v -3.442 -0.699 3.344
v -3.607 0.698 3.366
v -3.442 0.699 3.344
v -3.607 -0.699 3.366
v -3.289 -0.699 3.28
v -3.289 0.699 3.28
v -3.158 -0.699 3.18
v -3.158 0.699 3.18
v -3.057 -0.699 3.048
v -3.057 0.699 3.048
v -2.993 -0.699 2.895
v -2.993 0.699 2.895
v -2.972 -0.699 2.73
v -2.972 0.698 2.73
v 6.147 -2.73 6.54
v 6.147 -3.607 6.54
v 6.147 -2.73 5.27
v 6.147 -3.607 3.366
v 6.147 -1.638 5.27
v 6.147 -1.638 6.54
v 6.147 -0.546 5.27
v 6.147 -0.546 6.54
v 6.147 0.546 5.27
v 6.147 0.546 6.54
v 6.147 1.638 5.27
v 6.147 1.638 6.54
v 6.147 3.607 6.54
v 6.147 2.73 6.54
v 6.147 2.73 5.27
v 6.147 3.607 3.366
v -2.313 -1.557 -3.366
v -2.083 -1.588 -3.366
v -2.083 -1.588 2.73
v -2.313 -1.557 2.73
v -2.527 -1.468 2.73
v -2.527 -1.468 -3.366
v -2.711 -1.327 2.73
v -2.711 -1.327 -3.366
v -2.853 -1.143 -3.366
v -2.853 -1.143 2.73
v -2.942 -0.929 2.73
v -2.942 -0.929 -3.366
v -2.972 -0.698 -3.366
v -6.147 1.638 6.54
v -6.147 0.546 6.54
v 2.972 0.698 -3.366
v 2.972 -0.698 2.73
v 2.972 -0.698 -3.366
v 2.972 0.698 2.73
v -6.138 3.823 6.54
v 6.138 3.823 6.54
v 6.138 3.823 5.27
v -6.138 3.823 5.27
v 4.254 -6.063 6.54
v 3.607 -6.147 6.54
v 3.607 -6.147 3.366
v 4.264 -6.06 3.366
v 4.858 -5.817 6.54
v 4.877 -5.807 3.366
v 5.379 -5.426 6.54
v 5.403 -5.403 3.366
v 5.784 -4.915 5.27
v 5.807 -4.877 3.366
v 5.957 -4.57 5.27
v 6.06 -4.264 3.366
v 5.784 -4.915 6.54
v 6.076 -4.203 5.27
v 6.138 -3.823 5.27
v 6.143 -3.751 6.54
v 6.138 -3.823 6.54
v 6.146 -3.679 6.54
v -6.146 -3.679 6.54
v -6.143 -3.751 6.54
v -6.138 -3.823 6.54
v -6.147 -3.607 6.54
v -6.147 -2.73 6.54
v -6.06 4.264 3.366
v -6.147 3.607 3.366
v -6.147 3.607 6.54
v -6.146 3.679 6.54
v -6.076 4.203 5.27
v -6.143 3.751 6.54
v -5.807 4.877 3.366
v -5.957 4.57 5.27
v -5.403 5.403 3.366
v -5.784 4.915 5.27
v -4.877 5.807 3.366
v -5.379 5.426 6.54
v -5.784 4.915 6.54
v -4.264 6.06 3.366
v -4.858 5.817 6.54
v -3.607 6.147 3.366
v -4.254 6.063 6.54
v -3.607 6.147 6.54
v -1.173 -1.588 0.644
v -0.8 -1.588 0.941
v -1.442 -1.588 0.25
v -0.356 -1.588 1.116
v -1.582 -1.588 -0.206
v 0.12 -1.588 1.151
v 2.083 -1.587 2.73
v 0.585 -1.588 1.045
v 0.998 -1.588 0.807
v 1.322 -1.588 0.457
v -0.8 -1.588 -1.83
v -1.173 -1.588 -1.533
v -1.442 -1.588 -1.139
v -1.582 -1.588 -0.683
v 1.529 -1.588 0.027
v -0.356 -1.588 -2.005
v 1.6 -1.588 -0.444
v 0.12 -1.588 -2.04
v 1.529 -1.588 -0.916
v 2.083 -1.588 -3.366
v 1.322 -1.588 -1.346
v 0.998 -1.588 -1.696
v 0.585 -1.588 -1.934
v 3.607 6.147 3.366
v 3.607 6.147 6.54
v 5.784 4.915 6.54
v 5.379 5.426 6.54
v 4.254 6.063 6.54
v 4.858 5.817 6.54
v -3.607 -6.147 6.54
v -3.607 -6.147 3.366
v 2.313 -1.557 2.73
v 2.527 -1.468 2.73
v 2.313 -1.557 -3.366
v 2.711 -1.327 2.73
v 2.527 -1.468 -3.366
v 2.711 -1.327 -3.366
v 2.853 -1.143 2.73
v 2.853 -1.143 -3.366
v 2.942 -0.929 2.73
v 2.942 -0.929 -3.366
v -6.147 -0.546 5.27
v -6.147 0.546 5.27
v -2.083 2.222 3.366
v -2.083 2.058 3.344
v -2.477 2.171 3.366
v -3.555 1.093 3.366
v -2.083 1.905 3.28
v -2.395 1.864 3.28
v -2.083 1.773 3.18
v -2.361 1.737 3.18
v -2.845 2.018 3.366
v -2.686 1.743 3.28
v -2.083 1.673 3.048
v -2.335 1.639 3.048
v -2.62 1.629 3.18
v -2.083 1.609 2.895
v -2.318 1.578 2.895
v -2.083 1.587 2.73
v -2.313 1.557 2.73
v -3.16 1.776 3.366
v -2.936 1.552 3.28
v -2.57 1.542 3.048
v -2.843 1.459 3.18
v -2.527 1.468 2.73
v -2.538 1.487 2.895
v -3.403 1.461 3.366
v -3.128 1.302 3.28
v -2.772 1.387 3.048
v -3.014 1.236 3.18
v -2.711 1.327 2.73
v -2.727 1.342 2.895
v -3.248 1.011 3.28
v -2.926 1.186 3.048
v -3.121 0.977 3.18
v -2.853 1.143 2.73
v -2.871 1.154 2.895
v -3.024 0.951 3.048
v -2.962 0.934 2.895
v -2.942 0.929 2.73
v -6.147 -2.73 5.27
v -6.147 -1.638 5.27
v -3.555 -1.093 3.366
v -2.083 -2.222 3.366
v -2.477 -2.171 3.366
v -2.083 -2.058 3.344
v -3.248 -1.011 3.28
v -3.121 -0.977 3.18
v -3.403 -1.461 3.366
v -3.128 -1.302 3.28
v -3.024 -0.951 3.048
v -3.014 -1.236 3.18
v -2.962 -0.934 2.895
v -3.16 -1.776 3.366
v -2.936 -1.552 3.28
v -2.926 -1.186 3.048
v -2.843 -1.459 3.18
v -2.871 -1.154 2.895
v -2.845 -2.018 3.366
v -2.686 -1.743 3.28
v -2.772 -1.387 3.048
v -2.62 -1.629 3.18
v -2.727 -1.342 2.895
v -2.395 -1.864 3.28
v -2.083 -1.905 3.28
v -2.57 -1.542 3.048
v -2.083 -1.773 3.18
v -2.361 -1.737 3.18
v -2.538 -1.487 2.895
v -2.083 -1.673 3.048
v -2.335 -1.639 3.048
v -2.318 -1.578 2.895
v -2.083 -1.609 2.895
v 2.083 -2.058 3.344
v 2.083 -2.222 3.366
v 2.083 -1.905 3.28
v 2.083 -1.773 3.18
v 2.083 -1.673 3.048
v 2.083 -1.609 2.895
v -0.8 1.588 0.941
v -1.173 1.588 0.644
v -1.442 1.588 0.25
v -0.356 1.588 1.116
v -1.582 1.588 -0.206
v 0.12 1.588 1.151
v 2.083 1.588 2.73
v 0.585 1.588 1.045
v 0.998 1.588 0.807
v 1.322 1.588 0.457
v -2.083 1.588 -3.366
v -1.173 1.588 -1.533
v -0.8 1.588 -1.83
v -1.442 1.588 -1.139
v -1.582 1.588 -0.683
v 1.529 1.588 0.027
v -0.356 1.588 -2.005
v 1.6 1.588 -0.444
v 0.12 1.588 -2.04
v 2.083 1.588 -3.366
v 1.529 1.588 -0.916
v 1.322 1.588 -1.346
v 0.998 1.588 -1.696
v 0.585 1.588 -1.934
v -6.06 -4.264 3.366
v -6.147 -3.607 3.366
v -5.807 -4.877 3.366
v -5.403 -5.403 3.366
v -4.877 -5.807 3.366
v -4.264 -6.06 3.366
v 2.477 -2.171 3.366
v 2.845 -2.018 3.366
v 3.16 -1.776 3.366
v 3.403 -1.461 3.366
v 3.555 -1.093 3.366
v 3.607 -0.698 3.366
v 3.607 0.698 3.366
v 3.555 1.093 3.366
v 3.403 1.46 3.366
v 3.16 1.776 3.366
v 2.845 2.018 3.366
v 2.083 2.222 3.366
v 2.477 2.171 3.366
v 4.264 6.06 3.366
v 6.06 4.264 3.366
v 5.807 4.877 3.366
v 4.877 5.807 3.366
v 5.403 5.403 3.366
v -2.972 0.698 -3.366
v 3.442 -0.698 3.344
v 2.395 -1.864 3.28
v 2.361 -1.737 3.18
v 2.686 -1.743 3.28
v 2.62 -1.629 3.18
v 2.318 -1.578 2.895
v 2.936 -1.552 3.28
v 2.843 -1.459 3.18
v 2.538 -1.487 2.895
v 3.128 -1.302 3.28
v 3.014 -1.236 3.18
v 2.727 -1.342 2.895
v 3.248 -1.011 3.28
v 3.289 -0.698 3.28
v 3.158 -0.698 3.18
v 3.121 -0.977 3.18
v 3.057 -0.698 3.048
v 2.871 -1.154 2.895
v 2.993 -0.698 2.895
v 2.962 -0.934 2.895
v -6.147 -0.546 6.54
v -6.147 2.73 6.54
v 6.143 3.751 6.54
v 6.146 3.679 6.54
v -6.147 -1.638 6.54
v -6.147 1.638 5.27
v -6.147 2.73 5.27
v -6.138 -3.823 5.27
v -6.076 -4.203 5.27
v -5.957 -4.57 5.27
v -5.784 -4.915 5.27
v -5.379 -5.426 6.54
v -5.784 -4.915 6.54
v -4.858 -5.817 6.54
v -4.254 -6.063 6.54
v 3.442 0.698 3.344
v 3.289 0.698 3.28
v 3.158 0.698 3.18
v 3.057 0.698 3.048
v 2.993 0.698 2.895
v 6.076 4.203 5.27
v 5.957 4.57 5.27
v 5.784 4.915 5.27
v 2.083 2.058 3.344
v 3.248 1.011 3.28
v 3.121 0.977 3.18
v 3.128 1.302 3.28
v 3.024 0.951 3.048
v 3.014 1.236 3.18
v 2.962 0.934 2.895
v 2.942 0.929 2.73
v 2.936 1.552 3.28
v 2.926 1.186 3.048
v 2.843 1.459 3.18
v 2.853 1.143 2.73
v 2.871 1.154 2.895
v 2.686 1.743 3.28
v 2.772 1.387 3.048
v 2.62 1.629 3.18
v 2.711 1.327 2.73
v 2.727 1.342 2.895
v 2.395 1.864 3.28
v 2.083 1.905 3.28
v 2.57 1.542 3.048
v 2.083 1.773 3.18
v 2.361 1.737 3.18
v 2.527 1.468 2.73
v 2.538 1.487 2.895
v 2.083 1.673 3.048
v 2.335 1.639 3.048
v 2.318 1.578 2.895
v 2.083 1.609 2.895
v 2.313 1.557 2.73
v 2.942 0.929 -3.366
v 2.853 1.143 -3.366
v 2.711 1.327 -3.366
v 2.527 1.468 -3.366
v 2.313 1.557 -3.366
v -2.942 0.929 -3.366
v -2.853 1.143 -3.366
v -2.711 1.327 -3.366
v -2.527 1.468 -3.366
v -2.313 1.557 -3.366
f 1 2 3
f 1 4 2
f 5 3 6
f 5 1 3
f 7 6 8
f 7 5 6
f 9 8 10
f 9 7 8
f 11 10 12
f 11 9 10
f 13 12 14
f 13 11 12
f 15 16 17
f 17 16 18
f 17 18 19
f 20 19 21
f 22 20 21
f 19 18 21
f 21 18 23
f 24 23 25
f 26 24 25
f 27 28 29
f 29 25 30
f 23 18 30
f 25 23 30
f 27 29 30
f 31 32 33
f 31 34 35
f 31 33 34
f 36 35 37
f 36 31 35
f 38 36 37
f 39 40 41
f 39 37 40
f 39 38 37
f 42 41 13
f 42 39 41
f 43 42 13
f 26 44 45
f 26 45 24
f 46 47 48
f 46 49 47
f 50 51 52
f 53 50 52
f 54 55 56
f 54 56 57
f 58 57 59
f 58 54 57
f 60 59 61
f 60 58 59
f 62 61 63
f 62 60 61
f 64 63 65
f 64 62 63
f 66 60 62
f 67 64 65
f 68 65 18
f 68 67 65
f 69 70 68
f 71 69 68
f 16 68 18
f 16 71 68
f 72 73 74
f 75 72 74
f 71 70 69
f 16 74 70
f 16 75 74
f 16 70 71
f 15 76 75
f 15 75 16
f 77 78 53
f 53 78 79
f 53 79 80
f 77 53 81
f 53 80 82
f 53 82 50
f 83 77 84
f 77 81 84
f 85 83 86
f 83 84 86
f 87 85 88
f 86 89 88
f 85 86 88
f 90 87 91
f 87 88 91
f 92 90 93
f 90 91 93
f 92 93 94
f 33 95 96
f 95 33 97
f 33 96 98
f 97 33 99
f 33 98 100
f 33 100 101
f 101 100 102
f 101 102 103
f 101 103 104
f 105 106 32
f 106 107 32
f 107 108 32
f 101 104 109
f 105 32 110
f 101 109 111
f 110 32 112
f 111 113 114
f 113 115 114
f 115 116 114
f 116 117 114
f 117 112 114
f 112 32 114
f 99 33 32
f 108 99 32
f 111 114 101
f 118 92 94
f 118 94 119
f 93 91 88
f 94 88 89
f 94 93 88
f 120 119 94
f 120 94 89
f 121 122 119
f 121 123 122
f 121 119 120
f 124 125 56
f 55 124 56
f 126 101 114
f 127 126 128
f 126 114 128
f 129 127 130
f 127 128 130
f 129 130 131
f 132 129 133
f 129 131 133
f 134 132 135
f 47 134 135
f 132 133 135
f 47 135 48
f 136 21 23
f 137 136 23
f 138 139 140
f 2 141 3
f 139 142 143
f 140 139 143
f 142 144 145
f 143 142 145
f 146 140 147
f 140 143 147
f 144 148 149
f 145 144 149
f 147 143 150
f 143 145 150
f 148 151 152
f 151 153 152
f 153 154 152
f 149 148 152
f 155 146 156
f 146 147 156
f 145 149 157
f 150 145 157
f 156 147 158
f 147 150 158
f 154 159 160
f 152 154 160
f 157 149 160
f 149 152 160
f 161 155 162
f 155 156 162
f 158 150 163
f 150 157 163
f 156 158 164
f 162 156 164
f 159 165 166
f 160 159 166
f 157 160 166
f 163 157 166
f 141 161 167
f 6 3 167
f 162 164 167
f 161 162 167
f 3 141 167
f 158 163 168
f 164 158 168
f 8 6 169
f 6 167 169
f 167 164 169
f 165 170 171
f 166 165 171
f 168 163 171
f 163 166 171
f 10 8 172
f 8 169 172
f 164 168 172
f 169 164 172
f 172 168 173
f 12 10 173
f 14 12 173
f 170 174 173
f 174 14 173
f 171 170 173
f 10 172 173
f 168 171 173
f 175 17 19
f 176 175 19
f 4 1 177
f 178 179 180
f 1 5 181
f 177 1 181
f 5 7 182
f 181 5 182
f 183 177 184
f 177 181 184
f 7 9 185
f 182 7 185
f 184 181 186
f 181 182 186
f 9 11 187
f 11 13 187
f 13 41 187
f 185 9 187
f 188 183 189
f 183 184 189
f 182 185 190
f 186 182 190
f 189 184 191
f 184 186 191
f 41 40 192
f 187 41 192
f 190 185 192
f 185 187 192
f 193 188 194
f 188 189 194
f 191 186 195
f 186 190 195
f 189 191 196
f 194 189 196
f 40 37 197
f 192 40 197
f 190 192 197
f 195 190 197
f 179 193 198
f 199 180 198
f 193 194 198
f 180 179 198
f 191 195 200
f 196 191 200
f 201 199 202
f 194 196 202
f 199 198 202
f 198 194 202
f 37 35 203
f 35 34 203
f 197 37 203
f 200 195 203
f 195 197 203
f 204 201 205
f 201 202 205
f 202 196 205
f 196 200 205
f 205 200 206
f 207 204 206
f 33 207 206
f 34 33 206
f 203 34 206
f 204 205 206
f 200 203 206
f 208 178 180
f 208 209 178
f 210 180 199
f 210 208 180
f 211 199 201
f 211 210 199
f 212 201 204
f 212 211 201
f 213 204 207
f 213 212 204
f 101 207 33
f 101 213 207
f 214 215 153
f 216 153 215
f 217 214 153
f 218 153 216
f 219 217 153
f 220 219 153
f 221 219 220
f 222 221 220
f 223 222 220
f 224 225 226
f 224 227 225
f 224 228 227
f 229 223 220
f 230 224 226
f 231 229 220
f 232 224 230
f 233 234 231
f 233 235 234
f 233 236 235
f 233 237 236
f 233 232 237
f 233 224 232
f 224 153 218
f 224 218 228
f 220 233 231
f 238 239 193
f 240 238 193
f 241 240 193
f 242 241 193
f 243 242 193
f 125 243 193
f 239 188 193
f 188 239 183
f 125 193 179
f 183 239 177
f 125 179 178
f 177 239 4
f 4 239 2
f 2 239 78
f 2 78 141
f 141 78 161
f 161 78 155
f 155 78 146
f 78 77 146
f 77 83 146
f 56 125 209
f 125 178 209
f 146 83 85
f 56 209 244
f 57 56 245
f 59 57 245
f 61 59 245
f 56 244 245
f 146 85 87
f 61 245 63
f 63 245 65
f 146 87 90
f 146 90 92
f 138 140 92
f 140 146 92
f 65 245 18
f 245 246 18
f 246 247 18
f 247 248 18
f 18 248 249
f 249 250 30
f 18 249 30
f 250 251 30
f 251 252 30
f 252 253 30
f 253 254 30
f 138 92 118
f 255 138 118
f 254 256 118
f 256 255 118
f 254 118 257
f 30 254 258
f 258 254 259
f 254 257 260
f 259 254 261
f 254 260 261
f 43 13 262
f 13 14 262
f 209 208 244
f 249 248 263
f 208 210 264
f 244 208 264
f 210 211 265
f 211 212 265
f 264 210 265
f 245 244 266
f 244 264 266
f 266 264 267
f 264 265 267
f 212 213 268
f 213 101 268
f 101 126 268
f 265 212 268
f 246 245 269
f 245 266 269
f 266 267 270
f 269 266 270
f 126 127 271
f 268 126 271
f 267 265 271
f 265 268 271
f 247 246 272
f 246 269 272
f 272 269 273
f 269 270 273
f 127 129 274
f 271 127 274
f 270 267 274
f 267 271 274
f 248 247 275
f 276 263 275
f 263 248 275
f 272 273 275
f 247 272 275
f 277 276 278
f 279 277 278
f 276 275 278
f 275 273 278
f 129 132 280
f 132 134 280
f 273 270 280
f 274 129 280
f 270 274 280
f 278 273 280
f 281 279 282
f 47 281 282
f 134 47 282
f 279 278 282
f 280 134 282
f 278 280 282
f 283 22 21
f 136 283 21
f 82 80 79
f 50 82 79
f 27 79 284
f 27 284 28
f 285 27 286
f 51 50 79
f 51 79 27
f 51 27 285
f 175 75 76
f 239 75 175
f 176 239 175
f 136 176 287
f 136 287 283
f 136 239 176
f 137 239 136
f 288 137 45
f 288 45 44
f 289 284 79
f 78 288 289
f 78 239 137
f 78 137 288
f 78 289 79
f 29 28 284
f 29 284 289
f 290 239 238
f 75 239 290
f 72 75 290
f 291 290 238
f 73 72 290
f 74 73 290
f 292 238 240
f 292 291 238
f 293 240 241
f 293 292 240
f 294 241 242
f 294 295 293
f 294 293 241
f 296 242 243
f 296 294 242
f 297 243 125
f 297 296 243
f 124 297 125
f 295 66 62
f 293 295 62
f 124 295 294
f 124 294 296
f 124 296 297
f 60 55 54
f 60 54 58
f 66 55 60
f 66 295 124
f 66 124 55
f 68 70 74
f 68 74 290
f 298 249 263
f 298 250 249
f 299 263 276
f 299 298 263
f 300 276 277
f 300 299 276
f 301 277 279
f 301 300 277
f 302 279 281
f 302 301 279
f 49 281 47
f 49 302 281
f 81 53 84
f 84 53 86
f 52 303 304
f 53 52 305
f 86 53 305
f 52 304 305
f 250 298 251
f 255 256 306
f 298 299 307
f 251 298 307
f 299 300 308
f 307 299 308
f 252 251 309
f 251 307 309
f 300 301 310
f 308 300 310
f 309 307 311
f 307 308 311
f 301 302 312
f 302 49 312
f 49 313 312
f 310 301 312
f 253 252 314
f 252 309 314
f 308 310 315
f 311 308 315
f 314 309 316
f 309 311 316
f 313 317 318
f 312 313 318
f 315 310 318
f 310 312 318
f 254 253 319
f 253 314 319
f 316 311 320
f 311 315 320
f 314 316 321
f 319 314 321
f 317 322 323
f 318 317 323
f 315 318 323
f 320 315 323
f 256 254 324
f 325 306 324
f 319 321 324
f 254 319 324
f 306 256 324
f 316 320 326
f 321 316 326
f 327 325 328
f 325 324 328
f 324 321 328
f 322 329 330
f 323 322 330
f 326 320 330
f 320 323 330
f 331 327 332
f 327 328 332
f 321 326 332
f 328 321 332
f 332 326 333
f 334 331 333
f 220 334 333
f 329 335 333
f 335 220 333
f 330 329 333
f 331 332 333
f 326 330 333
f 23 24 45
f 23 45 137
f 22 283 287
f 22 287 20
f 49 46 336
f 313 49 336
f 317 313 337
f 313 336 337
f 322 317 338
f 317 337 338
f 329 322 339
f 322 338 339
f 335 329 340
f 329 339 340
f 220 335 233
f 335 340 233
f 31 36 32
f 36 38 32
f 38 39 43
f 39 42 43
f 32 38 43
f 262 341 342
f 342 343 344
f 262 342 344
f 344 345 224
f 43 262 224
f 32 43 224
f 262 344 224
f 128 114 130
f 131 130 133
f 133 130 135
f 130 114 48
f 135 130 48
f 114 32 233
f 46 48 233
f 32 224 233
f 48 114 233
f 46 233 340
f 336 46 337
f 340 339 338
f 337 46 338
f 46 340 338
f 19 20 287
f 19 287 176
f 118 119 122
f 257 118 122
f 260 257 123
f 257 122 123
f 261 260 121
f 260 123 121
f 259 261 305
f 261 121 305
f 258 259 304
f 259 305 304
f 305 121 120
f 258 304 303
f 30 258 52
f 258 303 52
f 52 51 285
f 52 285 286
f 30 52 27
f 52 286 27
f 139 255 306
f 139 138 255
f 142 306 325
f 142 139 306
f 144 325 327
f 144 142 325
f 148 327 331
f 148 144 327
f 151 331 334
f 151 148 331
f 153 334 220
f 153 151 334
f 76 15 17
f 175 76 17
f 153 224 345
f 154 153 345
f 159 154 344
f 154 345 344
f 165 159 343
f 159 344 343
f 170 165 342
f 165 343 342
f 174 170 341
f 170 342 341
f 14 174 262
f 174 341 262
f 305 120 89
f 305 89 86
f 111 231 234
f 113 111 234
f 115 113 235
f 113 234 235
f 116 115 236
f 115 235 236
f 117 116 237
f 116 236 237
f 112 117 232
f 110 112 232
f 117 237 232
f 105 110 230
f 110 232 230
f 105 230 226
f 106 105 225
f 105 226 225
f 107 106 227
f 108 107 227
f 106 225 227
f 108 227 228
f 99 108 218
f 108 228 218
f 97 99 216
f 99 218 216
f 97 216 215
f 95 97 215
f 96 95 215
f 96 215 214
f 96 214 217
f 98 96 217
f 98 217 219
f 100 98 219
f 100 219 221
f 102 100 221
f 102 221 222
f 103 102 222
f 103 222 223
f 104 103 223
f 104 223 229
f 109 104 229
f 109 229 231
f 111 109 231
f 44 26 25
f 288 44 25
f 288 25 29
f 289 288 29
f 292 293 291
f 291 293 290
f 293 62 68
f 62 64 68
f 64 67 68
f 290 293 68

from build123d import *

# Parameters (mm, degrees)
SKETCH1_W               = 5.9436
SKETCH1_H               = 6.731
BOSS_EXTRUDE1_DEPTH     = 1.5875
SKETCH2_W               = 12.2936
SKETCH2_H               = 12.2936
BOSS_EXTRUDE2_DEPTH     = 3.175
SKETCH3_R               = 1.6002
CUT_EXTRUDE1_DEPTH      = 5.5593
CUT_EXTRUDE1_DEPTH_BACK = 8.7343
FILLET1_R               = 0.889
FILLET2_R               = 0.635
FILLET3_R               = 2.54
SKETCH4_W               = 1.27
SKETCH4_H               = 1.0922
CUT_EXTRUDE2_DEPTH      = 7.1468
LPATTERN1_COUNT         = 3
LPATTERN1_PITCH         = 2.1844
LPATTERN1_COL_COUNT     = 3
LPATTERN1_COL_PITCH     = 2.1844


with BuildPart() as part:
    # Sketch1 → Boss-Extrude1 (new body, symmetric)
    with BuildSketch(Plane(origin=(0, 0, 0), x_dir=(1, 0, 0), z_dir=(0, 1, 0))):
        Rectangle(SKETCH1_W, SKETCH1_H)
    extrude(amount=BOSS_EXTRUDE1_DEPTH, both=True)

    # Sketch2 → Boss-Extrude2 (add)
    with BuildSketch(Plane.XY.offset(3.3655)):
        Rectangle(SKETCH2_W, SKETCH2_H)
    extrude(amount=BOSS_EXTRUDE2_DEPTH)

    # Sketch3 → Cut-Extrude1 (cut, two sides)
    with BuildSketch(Plane(origin=(0, 1.5875, 0), x_dir=(1, 0, 0), z_dir=(0, 1, 0))) as cut_extrude1_sk:
        with Locations((0, 0.4445)):
            Circle(SKETCH3_R)
    extrude(amount=CUT_EXTRUDE1_DEPTH, mode=Mode.SUBTRACT)
    extrude(cut_extrude1_sk.sketch, amount=-CUT_EXTRUDE1_DEPTH_BACK, mode=Mode.SUBTRACT)

    # Fillet1
    fillet1_edges = [part.edges().sort_by_distance(p)[0] for p in [
        (-2.9718, 1.5875, 0),
        (2.9718, 1.5875, 0),
        (-2.9718, -1.5875, 0),
        (2.9718, -1.5875, 0),
    ]]
    fillet(fillet1_edges, radius=FILLET1_R)

    # Fillet2
    fillet2_edges = [part.edges().sort_by_distance(p)[0] for p in [
        (2.9718, 0, 3.3655),
        (0, -1.5875, 3.3655),
        (-2.9718, 0, 3.3655),
        (0, 1.5875, 3.3655),
        (2.711417928, -1.327117928, 3.3655),
        (-2.711417928, -1.327117928, 3.3655),
        (-2.711417928, 1.327117928, 3.3655),
        (2.711417928, 1.327117928, 3.3655),
    ]]
    fillet(fillet2_edges, radius=FILLET2_R)

    # Fillet3
    fillet3_edges = [part.edges().sort_by_distance(p)[0] for p in [
        (6.1468, -6.1468, 4.953),
        (6.1468, 6.1468, 4.953),
        (-6.1468, 6.1468, 4.953),
        (-6.1468, -6.1468, 4.953),
    ]]
    fillet(fillet3_edges, radius=FILLET3_R)

    # Sketch4 → Cut-Extrude2 (cut, symmetric)
    with BuildSketch(Plane(origin=(0, 0, 0), x_dir=(0, 0, -1), z_dir=(1, 0, 0))):
        with Locations((-5.9055, 0)):
            Rectangle(SKETCH4_W, SKETCH4_H)
    cut_extrude2 = extrude(amount=CUT_EXTRUDE2_DEPTH, both=True, mode=Mode.SUBTRACT)

    # LPattern1: Cut-Extrude2 ×3
    with Locations(*[(0, i * LPATTERN1_PITCH, 0) for i in range(1, LPATTERN1_COUNT)]):
        add(cut_extrude2, mode=Mode.SUBTRACT)

    # LPattern1 col: Cut-Extrude2 ×3
    with Locations(*[(0, -i * LPATTERN1_COL_PITCH, 0) for i in range(1, LPATTERN1_COL_COUNT)]):
        add(cut_extrude2, mode=Mode.SUBTRACT)


solid = part.part
